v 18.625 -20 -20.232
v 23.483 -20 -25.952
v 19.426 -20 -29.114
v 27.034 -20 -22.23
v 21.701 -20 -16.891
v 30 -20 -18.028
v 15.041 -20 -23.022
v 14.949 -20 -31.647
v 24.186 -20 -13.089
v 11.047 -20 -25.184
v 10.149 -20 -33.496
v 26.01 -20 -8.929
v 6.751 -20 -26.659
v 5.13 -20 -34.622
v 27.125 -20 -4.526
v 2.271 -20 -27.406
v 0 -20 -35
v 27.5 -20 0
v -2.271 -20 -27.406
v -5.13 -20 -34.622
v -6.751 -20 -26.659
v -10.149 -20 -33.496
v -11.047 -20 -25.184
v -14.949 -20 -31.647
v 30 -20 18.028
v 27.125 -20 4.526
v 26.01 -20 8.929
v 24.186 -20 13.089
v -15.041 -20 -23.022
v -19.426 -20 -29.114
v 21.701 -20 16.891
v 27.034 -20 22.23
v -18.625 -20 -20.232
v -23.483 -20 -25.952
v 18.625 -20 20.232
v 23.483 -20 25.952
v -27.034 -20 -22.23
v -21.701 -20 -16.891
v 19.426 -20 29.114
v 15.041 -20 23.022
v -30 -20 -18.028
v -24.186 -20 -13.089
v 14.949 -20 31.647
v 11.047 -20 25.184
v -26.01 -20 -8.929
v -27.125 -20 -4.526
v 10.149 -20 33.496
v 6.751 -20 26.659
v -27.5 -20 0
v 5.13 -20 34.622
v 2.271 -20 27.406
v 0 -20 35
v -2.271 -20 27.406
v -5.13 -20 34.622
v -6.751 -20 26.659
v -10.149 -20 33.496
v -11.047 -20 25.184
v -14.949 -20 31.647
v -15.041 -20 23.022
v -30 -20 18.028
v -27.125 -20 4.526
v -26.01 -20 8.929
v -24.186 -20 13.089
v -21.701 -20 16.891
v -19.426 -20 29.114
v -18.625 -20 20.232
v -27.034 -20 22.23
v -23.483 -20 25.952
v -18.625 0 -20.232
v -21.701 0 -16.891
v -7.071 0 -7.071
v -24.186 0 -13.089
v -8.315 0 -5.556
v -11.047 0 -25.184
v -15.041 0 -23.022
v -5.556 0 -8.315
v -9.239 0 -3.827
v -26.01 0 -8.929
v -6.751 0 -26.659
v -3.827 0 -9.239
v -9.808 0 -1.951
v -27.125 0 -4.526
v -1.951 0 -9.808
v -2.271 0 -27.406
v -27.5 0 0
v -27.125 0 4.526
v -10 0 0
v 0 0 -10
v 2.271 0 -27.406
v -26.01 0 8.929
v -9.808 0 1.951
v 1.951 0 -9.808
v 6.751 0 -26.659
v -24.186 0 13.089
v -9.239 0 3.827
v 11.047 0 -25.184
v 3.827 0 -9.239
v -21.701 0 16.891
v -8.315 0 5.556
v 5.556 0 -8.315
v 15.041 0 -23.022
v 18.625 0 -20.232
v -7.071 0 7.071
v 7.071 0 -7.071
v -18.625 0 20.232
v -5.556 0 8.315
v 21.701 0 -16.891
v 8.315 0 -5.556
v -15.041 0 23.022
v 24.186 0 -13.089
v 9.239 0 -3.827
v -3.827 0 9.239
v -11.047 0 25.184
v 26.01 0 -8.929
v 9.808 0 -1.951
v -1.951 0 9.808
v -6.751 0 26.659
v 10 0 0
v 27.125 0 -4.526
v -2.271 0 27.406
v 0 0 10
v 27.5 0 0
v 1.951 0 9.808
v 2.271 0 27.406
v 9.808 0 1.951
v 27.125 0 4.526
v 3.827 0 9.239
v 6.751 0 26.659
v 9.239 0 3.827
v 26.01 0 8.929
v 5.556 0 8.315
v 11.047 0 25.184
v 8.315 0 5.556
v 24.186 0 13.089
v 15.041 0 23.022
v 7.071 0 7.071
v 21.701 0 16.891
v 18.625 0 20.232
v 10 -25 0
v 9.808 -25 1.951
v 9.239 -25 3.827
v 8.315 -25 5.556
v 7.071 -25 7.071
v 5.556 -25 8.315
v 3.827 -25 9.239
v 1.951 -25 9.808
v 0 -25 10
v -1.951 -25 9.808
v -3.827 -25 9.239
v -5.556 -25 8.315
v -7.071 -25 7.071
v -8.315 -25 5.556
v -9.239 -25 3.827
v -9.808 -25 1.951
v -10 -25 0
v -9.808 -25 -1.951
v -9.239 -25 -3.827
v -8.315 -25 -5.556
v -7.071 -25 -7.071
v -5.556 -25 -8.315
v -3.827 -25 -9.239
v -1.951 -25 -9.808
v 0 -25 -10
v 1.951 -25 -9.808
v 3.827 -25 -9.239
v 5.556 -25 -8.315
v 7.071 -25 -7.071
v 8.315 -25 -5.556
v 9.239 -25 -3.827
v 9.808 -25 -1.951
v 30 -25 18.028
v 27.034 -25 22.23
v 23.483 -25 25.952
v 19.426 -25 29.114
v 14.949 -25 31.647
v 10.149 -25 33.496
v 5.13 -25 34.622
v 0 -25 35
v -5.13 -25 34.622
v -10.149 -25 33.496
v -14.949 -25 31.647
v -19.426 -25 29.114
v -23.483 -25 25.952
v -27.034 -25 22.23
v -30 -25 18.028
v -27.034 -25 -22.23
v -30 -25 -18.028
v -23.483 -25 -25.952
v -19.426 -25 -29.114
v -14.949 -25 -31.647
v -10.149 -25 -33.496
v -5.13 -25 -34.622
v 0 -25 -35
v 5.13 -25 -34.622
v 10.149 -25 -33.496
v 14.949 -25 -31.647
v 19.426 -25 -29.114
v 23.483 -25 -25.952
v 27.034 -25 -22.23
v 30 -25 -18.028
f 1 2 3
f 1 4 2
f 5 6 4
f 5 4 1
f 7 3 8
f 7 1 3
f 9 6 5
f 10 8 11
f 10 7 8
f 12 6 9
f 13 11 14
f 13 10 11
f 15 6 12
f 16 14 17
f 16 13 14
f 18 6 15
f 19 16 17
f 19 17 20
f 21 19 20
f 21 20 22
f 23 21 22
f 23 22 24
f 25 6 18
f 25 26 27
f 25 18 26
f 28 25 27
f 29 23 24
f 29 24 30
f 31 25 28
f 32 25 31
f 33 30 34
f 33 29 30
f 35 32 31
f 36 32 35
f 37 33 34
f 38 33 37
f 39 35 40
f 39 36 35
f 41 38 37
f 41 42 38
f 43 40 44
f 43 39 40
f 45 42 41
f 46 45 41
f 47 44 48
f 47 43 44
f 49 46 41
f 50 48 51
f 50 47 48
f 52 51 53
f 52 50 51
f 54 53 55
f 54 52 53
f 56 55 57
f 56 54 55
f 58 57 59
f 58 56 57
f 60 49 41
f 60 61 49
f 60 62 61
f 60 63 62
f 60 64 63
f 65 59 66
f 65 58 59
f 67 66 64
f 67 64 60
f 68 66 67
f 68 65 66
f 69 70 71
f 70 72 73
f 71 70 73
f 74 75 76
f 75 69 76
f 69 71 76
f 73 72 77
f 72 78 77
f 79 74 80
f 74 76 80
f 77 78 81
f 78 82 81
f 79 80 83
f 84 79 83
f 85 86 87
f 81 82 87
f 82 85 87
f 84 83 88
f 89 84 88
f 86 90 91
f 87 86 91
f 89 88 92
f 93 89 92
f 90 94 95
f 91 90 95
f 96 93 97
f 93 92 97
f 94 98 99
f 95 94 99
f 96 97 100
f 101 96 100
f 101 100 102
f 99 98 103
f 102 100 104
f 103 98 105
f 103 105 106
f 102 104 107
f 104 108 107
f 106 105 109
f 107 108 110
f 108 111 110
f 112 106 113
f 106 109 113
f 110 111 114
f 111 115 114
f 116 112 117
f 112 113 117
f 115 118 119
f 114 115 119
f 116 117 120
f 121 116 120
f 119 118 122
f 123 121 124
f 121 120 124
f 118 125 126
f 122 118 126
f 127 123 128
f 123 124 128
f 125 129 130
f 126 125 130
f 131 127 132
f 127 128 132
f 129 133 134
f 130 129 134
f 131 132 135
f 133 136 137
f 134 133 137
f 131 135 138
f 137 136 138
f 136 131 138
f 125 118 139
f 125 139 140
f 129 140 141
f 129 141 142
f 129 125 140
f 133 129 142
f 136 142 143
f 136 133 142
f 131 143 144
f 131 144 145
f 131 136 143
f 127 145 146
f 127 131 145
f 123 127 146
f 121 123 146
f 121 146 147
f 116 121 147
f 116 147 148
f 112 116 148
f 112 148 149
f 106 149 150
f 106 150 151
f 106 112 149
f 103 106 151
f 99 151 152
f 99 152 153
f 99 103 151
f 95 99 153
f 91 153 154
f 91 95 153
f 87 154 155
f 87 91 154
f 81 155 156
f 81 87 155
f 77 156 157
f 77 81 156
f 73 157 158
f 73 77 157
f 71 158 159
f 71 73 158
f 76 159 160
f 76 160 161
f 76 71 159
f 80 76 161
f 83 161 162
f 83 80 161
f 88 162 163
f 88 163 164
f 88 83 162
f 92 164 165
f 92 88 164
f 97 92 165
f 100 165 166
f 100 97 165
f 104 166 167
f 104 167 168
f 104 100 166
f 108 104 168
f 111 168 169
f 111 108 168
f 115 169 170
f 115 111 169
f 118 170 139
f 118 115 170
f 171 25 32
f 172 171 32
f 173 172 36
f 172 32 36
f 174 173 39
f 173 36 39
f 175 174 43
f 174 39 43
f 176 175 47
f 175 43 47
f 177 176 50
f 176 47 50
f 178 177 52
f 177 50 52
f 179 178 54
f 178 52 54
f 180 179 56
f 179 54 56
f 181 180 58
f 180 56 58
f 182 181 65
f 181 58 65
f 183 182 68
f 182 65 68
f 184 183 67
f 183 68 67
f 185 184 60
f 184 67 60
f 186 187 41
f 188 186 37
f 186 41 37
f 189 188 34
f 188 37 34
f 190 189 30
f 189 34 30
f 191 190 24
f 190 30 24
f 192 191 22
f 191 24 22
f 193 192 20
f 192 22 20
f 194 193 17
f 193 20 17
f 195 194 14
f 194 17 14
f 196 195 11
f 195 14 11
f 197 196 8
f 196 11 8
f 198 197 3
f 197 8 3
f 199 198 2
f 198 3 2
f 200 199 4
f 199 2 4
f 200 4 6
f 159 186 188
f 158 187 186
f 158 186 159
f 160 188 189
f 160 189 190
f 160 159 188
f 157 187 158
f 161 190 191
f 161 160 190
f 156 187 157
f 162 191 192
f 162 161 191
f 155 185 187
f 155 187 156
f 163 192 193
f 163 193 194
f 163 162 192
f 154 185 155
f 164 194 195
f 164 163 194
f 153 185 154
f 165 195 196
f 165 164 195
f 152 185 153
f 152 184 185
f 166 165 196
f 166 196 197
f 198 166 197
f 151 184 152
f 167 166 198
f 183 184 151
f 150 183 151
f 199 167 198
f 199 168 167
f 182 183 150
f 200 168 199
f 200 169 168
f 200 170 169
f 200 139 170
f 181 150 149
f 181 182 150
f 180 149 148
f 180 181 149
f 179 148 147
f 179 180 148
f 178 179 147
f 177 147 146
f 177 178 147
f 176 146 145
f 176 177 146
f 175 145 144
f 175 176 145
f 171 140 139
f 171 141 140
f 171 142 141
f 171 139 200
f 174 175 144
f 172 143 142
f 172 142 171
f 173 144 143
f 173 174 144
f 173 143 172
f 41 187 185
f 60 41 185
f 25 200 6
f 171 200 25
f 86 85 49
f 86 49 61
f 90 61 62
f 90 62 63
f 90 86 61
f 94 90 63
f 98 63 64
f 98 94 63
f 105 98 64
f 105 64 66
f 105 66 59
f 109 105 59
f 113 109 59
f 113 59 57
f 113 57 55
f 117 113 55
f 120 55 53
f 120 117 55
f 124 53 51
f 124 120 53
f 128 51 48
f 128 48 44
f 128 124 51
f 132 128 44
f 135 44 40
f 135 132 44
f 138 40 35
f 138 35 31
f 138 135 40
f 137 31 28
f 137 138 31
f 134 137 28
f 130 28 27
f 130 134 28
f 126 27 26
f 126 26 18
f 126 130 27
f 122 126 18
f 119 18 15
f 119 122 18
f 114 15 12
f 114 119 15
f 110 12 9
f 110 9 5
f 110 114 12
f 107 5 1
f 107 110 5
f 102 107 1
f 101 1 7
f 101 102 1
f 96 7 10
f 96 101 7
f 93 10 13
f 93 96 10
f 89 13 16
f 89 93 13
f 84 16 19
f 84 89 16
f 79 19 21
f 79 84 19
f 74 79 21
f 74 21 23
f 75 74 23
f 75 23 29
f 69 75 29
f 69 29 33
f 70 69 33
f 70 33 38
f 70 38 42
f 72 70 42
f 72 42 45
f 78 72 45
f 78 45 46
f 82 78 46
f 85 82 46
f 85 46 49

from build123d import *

# Parameters (mm, degrees)
F0_R     = 35
F0_R_2   = 10
F1_DEPTH = 25
F2_R     = 35
F2_R_2   = 27.5
F3_DEPTH = 20
F4_W     = 13.364931
F4_H     = 62.559245
F5_DEPTH = 25


with BuildPart() as f1:
    # F0 (on Front) → F1 (new body)
    with BuildSketch(Plane.XZ):
        Circle(F0_R)
        Circle(F0_R_2, mode=Mode.SUBTRACT)
    extrude(amount=F1_DEPTH)

    # F2 (on face) → F3 (cut)
    with BuildSketch(Plane(origin=(0, 0, 0), x_dir=(-1, 0, 0), z_dir=(0, 1, 0))):
        Circle(F2_R)
        Circle(F2_R_2, mode=Mode.SUBTRACT)
    extrude(amount=-F3_DEPTH, mode=Mode.SUBTRACT)

    # F4 (on face) → F5 (cut)
    with BuildSketch(Plane.XZ.offset(25)):
        with Locations((-36.682465, -1.913552)):
            Rectangle(F4_W, F4_H)
        with Locations((36.682465, -1.913552)):
            Rectangle(F4_W, F4_H)
    extrude(amount=-F5_DEPTH, mode=Mode.SUBTRACT)


solid = f1.part
